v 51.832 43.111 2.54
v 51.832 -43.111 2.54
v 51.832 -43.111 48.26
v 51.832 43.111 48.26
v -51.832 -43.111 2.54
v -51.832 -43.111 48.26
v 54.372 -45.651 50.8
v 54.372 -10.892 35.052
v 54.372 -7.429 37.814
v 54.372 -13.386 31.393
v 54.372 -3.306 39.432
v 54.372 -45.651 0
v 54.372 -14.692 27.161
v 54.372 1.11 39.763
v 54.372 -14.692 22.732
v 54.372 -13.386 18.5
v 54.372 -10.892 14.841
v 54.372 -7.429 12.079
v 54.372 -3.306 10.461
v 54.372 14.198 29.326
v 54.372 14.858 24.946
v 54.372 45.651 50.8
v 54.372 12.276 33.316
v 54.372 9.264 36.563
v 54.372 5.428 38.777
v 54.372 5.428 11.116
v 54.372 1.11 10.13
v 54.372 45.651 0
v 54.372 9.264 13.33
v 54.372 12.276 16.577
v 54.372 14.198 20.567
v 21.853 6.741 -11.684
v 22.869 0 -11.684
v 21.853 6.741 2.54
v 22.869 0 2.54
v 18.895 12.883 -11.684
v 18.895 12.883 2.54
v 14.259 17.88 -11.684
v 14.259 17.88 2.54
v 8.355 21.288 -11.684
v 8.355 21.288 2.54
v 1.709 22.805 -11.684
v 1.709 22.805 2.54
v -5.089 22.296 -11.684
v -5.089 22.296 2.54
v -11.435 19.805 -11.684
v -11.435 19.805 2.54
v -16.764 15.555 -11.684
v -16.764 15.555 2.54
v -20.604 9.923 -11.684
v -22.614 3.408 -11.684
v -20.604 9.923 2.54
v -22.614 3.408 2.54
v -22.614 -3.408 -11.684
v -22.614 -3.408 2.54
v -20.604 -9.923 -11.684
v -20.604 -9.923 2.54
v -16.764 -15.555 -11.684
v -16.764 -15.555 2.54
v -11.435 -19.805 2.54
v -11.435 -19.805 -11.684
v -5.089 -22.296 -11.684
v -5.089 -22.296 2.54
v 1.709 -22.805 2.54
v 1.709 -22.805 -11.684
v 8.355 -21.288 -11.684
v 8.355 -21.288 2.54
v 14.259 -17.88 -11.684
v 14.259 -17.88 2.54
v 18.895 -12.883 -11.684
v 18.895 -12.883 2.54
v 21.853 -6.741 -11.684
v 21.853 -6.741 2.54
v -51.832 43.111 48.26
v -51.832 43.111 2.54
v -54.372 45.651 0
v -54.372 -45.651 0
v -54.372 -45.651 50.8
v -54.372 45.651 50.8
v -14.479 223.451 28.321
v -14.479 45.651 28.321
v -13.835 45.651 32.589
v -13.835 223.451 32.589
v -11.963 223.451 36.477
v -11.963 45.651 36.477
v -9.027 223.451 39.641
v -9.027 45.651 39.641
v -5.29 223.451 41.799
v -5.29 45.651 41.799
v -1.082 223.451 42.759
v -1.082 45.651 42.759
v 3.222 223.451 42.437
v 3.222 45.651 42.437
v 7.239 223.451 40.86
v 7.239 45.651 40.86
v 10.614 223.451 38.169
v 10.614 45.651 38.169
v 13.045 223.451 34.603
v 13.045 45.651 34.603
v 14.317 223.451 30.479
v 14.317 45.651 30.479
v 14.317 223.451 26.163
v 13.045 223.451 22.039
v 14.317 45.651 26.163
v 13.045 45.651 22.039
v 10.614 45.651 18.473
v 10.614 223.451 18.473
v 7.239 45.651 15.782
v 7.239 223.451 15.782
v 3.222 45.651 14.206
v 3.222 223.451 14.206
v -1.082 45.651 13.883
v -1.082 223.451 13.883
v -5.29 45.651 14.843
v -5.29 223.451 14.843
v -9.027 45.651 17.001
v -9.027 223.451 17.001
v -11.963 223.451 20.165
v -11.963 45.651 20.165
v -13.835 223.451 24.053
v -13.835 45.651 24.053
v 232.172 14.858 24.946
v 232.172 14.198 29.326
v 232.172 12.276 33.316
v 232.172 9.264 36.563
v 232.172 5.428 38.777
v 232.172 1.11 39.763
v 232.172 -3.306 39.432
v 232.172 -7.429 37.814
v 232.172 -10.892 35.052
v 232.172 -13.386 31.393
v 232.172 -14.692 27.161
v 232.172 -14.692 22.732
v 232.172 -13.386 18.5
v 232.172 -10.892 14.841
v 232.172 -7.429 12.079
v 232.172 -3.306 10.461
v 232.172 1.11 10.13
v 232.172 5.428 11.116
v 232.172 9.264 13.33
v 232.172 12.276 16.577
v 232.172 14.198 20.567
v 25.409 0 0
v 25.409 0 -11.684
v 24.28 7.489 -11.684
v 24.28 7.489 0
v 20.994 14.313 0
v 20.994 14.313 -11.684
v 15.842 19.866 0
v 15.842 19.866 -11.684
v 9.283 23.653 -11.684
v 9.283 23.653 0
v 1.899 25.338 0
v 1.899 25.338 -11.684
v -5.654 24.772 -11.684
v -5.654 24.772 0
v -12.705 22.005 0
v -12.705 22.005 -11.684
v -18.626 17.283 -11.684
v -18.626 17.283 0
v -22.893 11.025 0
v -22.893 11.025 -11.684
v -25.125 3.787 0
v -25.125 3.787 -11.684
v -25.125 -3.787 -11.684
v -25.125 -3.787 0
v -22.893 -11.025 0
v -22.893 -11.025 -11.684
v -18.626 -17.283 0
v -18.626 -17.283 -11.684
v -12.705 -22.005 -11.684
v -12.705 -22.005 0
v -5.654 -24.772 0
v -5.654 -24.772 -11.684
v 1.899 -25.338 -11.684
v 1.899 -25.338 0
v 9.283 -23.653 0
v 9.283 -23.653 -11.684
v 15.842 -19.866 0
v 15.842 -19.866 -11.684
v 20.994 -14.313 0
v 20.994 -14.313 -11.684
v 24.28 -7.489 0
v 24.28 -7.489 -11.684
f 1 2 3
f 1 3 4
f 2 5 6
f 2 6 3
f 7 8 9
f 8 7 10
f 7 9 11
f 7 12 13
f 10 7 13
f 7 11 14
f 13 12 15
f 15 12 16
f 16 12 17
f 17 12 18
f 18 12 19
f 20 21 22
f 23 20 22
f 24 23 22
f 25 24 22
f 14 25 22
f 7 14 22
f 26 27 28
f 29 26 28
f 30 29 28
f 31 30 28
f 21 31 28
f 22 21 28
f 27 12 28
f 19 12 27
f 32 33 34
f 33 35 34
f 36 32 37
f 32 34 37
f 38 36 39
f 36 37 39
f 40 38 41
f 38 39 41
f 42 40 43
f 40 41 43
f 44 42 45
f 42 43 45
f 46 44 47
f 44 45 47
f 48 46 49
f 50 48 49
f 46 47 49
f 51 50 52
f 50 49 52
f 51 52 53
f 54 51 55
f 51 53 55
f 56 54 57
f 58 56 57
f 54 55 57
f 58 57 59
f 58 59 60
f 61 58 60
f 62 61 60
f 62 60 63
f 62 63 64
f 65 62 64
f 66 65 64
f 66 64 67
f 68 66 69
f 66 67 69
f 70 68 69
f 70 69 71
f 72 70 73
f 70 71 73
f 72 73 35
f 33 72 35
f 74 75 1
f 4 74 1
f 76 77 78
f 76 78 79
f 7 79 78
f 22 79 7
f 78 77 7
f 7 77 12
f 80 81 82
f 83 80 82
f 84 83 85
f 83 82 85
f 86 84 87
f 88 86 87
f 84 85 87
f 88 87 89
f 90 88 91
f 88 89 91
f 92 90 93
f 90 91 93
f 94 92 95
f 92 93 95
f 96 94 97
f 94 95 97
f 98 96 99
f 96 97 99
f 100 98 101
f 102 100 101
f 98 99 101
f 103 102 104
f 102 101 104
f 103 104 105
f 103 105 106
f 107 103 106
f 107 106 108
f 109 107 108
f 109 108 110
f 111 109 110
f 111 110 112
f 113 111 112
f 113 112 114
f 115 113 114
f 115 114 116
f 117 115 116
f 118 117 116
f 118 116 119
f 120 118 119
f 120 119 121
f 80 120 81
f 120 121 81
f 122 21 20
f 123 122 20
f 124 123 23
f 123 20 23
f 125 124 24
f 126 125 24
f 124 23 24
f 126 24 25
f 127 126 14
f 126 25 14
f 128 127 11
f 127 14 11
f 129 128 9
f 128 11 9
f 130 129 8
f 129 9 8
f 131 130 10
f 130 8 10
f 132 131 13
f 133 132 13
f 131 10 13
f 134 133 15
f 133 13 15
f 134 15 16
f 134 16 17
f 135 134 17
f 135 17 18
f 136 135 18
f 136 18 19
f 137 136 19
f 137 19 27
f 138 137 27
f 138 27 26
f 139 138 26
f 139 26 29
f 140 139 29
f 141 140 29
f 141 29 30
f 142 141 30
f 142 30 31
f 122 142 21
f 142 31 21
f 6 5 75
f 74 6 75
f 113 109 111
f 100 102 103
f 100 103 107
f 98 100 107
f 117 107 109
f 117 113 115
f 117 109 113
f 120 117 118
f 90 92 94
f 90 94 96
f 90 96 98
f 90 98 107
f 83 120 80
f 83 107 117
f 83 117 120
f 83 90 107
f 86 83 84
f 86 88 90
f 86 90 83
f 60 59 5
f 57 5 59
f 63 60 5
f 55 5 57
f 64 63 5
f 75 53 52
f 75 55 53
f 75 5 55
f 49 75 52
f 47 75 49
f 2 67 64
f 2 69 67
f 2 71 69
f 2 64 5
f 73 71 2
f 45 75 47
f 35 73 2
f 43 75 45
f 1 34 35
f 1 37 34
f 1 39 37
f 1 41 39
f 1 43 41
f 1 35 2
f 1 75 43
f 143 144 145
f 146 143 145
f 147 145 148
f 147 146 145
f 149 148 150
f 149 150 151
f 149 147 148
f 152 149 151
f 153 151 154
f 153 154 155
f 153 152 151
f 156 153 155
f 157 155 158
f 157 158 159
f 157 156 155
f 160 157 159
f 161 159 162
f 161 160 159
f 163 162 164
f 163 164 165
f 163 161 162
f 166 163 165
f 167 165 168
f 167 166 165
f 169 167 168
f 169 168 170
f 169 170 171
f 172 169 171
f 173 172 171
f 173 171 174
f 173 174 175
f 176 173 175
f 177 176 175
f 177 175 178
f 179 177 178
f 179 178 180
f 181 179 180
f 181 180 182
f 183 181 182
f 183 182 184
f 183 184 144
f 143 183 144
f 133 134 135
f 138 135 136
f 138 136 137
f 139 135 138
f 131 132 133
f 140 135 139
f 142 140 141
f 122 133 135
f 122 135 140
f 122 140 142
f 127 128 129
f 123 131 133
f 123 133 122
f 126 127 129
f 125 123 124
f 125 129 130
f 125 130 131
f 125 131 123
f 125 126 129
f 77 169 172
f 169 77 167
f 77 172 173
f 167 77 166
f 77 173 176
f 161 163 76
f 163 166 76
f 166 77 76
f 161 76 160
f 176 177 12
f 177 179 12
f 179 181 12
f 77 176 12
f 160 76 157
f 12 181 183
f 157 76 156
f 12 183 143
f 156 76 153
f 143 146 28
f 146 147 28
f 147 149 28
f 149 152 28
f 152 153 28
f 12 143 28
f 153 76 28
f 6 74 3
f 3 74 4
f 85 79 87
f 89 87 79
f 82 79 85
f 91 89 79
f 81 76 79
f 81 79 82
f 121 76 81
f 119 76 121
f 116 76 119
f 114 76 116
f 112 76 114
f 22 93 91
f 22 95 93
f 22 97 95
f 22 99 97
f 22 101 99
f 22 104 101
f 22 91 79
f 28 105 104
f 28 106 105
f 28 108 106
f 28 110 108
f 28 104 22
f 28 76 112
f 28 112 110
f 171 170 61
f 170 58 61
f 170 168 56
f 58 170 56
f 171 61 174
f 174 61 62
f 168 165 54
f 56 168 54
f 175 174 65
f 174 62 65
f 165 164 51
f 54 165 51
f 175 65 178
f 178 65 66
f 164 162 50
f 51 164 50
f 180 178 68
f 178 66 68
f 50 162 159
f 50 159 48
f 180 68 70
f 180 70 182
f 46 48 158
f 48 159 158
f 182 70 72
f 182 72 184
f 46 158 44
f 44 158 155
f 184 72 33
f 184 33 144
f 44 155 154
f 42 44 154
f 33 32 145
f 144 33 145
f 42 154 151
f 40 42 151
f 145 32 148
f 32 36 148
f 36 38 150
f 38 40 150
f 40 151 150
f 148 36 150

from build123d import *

# Parameters (mm, degrees)
F0_W     = 108.7436452508
F0_H     = 91.3013890386
F1_DEPTH = 50.8
F2_R     = 25.409051706
F3_DEPTH = 62.484
F4_T     = -2.54
F5_R     = 14.8578389164
F6_DEPTH = 177.8
F7_R     = 14.4786681192
F8_DEPTH = 177.8


with BuildPart() as f1:
    # F0 (on Top) → F1 (new body)
    with BuildSketch(Plane.XY):
        Rectangle(F0_W, F0_H)
    extrude(amount=F1_DEPTH)

    # F2 (on face) → F3 (join)
    with BuildSketch(Plane.XY.offset(50.8)):
        Circle(F2_R)
    extrude(amount=-F3_DEPTH)

    # F4
    f4_openings = [f1.faces().sort_by_distance(p)[0] for p in [
        (0, 0, -11.684),
    ]]
    offset(amount=F4_T, openings=f4_openings, kind=Kind.INTERSECTION)

    # F5 (on face) → F6 (join)
    with BuildSketch(Plane.YZ.offset(54.3718226254)):
        with Locations((0, 24.9464344233)):
            Circle(F5_R)
    extrude(amount=F6_DEPTH)

    # F7 (on face) → F8 (join)
    with BuildSketch(Plane(origin=(0, 45.6506945193, 0), x_dir=(-1, 0, 0), z_dir=(0, 1, 0))):
        with Locations((0, 28.3211600035)):
            Circle(F7_R)
    extrude(amount=F8_DEPTH)


solid = f1.part
